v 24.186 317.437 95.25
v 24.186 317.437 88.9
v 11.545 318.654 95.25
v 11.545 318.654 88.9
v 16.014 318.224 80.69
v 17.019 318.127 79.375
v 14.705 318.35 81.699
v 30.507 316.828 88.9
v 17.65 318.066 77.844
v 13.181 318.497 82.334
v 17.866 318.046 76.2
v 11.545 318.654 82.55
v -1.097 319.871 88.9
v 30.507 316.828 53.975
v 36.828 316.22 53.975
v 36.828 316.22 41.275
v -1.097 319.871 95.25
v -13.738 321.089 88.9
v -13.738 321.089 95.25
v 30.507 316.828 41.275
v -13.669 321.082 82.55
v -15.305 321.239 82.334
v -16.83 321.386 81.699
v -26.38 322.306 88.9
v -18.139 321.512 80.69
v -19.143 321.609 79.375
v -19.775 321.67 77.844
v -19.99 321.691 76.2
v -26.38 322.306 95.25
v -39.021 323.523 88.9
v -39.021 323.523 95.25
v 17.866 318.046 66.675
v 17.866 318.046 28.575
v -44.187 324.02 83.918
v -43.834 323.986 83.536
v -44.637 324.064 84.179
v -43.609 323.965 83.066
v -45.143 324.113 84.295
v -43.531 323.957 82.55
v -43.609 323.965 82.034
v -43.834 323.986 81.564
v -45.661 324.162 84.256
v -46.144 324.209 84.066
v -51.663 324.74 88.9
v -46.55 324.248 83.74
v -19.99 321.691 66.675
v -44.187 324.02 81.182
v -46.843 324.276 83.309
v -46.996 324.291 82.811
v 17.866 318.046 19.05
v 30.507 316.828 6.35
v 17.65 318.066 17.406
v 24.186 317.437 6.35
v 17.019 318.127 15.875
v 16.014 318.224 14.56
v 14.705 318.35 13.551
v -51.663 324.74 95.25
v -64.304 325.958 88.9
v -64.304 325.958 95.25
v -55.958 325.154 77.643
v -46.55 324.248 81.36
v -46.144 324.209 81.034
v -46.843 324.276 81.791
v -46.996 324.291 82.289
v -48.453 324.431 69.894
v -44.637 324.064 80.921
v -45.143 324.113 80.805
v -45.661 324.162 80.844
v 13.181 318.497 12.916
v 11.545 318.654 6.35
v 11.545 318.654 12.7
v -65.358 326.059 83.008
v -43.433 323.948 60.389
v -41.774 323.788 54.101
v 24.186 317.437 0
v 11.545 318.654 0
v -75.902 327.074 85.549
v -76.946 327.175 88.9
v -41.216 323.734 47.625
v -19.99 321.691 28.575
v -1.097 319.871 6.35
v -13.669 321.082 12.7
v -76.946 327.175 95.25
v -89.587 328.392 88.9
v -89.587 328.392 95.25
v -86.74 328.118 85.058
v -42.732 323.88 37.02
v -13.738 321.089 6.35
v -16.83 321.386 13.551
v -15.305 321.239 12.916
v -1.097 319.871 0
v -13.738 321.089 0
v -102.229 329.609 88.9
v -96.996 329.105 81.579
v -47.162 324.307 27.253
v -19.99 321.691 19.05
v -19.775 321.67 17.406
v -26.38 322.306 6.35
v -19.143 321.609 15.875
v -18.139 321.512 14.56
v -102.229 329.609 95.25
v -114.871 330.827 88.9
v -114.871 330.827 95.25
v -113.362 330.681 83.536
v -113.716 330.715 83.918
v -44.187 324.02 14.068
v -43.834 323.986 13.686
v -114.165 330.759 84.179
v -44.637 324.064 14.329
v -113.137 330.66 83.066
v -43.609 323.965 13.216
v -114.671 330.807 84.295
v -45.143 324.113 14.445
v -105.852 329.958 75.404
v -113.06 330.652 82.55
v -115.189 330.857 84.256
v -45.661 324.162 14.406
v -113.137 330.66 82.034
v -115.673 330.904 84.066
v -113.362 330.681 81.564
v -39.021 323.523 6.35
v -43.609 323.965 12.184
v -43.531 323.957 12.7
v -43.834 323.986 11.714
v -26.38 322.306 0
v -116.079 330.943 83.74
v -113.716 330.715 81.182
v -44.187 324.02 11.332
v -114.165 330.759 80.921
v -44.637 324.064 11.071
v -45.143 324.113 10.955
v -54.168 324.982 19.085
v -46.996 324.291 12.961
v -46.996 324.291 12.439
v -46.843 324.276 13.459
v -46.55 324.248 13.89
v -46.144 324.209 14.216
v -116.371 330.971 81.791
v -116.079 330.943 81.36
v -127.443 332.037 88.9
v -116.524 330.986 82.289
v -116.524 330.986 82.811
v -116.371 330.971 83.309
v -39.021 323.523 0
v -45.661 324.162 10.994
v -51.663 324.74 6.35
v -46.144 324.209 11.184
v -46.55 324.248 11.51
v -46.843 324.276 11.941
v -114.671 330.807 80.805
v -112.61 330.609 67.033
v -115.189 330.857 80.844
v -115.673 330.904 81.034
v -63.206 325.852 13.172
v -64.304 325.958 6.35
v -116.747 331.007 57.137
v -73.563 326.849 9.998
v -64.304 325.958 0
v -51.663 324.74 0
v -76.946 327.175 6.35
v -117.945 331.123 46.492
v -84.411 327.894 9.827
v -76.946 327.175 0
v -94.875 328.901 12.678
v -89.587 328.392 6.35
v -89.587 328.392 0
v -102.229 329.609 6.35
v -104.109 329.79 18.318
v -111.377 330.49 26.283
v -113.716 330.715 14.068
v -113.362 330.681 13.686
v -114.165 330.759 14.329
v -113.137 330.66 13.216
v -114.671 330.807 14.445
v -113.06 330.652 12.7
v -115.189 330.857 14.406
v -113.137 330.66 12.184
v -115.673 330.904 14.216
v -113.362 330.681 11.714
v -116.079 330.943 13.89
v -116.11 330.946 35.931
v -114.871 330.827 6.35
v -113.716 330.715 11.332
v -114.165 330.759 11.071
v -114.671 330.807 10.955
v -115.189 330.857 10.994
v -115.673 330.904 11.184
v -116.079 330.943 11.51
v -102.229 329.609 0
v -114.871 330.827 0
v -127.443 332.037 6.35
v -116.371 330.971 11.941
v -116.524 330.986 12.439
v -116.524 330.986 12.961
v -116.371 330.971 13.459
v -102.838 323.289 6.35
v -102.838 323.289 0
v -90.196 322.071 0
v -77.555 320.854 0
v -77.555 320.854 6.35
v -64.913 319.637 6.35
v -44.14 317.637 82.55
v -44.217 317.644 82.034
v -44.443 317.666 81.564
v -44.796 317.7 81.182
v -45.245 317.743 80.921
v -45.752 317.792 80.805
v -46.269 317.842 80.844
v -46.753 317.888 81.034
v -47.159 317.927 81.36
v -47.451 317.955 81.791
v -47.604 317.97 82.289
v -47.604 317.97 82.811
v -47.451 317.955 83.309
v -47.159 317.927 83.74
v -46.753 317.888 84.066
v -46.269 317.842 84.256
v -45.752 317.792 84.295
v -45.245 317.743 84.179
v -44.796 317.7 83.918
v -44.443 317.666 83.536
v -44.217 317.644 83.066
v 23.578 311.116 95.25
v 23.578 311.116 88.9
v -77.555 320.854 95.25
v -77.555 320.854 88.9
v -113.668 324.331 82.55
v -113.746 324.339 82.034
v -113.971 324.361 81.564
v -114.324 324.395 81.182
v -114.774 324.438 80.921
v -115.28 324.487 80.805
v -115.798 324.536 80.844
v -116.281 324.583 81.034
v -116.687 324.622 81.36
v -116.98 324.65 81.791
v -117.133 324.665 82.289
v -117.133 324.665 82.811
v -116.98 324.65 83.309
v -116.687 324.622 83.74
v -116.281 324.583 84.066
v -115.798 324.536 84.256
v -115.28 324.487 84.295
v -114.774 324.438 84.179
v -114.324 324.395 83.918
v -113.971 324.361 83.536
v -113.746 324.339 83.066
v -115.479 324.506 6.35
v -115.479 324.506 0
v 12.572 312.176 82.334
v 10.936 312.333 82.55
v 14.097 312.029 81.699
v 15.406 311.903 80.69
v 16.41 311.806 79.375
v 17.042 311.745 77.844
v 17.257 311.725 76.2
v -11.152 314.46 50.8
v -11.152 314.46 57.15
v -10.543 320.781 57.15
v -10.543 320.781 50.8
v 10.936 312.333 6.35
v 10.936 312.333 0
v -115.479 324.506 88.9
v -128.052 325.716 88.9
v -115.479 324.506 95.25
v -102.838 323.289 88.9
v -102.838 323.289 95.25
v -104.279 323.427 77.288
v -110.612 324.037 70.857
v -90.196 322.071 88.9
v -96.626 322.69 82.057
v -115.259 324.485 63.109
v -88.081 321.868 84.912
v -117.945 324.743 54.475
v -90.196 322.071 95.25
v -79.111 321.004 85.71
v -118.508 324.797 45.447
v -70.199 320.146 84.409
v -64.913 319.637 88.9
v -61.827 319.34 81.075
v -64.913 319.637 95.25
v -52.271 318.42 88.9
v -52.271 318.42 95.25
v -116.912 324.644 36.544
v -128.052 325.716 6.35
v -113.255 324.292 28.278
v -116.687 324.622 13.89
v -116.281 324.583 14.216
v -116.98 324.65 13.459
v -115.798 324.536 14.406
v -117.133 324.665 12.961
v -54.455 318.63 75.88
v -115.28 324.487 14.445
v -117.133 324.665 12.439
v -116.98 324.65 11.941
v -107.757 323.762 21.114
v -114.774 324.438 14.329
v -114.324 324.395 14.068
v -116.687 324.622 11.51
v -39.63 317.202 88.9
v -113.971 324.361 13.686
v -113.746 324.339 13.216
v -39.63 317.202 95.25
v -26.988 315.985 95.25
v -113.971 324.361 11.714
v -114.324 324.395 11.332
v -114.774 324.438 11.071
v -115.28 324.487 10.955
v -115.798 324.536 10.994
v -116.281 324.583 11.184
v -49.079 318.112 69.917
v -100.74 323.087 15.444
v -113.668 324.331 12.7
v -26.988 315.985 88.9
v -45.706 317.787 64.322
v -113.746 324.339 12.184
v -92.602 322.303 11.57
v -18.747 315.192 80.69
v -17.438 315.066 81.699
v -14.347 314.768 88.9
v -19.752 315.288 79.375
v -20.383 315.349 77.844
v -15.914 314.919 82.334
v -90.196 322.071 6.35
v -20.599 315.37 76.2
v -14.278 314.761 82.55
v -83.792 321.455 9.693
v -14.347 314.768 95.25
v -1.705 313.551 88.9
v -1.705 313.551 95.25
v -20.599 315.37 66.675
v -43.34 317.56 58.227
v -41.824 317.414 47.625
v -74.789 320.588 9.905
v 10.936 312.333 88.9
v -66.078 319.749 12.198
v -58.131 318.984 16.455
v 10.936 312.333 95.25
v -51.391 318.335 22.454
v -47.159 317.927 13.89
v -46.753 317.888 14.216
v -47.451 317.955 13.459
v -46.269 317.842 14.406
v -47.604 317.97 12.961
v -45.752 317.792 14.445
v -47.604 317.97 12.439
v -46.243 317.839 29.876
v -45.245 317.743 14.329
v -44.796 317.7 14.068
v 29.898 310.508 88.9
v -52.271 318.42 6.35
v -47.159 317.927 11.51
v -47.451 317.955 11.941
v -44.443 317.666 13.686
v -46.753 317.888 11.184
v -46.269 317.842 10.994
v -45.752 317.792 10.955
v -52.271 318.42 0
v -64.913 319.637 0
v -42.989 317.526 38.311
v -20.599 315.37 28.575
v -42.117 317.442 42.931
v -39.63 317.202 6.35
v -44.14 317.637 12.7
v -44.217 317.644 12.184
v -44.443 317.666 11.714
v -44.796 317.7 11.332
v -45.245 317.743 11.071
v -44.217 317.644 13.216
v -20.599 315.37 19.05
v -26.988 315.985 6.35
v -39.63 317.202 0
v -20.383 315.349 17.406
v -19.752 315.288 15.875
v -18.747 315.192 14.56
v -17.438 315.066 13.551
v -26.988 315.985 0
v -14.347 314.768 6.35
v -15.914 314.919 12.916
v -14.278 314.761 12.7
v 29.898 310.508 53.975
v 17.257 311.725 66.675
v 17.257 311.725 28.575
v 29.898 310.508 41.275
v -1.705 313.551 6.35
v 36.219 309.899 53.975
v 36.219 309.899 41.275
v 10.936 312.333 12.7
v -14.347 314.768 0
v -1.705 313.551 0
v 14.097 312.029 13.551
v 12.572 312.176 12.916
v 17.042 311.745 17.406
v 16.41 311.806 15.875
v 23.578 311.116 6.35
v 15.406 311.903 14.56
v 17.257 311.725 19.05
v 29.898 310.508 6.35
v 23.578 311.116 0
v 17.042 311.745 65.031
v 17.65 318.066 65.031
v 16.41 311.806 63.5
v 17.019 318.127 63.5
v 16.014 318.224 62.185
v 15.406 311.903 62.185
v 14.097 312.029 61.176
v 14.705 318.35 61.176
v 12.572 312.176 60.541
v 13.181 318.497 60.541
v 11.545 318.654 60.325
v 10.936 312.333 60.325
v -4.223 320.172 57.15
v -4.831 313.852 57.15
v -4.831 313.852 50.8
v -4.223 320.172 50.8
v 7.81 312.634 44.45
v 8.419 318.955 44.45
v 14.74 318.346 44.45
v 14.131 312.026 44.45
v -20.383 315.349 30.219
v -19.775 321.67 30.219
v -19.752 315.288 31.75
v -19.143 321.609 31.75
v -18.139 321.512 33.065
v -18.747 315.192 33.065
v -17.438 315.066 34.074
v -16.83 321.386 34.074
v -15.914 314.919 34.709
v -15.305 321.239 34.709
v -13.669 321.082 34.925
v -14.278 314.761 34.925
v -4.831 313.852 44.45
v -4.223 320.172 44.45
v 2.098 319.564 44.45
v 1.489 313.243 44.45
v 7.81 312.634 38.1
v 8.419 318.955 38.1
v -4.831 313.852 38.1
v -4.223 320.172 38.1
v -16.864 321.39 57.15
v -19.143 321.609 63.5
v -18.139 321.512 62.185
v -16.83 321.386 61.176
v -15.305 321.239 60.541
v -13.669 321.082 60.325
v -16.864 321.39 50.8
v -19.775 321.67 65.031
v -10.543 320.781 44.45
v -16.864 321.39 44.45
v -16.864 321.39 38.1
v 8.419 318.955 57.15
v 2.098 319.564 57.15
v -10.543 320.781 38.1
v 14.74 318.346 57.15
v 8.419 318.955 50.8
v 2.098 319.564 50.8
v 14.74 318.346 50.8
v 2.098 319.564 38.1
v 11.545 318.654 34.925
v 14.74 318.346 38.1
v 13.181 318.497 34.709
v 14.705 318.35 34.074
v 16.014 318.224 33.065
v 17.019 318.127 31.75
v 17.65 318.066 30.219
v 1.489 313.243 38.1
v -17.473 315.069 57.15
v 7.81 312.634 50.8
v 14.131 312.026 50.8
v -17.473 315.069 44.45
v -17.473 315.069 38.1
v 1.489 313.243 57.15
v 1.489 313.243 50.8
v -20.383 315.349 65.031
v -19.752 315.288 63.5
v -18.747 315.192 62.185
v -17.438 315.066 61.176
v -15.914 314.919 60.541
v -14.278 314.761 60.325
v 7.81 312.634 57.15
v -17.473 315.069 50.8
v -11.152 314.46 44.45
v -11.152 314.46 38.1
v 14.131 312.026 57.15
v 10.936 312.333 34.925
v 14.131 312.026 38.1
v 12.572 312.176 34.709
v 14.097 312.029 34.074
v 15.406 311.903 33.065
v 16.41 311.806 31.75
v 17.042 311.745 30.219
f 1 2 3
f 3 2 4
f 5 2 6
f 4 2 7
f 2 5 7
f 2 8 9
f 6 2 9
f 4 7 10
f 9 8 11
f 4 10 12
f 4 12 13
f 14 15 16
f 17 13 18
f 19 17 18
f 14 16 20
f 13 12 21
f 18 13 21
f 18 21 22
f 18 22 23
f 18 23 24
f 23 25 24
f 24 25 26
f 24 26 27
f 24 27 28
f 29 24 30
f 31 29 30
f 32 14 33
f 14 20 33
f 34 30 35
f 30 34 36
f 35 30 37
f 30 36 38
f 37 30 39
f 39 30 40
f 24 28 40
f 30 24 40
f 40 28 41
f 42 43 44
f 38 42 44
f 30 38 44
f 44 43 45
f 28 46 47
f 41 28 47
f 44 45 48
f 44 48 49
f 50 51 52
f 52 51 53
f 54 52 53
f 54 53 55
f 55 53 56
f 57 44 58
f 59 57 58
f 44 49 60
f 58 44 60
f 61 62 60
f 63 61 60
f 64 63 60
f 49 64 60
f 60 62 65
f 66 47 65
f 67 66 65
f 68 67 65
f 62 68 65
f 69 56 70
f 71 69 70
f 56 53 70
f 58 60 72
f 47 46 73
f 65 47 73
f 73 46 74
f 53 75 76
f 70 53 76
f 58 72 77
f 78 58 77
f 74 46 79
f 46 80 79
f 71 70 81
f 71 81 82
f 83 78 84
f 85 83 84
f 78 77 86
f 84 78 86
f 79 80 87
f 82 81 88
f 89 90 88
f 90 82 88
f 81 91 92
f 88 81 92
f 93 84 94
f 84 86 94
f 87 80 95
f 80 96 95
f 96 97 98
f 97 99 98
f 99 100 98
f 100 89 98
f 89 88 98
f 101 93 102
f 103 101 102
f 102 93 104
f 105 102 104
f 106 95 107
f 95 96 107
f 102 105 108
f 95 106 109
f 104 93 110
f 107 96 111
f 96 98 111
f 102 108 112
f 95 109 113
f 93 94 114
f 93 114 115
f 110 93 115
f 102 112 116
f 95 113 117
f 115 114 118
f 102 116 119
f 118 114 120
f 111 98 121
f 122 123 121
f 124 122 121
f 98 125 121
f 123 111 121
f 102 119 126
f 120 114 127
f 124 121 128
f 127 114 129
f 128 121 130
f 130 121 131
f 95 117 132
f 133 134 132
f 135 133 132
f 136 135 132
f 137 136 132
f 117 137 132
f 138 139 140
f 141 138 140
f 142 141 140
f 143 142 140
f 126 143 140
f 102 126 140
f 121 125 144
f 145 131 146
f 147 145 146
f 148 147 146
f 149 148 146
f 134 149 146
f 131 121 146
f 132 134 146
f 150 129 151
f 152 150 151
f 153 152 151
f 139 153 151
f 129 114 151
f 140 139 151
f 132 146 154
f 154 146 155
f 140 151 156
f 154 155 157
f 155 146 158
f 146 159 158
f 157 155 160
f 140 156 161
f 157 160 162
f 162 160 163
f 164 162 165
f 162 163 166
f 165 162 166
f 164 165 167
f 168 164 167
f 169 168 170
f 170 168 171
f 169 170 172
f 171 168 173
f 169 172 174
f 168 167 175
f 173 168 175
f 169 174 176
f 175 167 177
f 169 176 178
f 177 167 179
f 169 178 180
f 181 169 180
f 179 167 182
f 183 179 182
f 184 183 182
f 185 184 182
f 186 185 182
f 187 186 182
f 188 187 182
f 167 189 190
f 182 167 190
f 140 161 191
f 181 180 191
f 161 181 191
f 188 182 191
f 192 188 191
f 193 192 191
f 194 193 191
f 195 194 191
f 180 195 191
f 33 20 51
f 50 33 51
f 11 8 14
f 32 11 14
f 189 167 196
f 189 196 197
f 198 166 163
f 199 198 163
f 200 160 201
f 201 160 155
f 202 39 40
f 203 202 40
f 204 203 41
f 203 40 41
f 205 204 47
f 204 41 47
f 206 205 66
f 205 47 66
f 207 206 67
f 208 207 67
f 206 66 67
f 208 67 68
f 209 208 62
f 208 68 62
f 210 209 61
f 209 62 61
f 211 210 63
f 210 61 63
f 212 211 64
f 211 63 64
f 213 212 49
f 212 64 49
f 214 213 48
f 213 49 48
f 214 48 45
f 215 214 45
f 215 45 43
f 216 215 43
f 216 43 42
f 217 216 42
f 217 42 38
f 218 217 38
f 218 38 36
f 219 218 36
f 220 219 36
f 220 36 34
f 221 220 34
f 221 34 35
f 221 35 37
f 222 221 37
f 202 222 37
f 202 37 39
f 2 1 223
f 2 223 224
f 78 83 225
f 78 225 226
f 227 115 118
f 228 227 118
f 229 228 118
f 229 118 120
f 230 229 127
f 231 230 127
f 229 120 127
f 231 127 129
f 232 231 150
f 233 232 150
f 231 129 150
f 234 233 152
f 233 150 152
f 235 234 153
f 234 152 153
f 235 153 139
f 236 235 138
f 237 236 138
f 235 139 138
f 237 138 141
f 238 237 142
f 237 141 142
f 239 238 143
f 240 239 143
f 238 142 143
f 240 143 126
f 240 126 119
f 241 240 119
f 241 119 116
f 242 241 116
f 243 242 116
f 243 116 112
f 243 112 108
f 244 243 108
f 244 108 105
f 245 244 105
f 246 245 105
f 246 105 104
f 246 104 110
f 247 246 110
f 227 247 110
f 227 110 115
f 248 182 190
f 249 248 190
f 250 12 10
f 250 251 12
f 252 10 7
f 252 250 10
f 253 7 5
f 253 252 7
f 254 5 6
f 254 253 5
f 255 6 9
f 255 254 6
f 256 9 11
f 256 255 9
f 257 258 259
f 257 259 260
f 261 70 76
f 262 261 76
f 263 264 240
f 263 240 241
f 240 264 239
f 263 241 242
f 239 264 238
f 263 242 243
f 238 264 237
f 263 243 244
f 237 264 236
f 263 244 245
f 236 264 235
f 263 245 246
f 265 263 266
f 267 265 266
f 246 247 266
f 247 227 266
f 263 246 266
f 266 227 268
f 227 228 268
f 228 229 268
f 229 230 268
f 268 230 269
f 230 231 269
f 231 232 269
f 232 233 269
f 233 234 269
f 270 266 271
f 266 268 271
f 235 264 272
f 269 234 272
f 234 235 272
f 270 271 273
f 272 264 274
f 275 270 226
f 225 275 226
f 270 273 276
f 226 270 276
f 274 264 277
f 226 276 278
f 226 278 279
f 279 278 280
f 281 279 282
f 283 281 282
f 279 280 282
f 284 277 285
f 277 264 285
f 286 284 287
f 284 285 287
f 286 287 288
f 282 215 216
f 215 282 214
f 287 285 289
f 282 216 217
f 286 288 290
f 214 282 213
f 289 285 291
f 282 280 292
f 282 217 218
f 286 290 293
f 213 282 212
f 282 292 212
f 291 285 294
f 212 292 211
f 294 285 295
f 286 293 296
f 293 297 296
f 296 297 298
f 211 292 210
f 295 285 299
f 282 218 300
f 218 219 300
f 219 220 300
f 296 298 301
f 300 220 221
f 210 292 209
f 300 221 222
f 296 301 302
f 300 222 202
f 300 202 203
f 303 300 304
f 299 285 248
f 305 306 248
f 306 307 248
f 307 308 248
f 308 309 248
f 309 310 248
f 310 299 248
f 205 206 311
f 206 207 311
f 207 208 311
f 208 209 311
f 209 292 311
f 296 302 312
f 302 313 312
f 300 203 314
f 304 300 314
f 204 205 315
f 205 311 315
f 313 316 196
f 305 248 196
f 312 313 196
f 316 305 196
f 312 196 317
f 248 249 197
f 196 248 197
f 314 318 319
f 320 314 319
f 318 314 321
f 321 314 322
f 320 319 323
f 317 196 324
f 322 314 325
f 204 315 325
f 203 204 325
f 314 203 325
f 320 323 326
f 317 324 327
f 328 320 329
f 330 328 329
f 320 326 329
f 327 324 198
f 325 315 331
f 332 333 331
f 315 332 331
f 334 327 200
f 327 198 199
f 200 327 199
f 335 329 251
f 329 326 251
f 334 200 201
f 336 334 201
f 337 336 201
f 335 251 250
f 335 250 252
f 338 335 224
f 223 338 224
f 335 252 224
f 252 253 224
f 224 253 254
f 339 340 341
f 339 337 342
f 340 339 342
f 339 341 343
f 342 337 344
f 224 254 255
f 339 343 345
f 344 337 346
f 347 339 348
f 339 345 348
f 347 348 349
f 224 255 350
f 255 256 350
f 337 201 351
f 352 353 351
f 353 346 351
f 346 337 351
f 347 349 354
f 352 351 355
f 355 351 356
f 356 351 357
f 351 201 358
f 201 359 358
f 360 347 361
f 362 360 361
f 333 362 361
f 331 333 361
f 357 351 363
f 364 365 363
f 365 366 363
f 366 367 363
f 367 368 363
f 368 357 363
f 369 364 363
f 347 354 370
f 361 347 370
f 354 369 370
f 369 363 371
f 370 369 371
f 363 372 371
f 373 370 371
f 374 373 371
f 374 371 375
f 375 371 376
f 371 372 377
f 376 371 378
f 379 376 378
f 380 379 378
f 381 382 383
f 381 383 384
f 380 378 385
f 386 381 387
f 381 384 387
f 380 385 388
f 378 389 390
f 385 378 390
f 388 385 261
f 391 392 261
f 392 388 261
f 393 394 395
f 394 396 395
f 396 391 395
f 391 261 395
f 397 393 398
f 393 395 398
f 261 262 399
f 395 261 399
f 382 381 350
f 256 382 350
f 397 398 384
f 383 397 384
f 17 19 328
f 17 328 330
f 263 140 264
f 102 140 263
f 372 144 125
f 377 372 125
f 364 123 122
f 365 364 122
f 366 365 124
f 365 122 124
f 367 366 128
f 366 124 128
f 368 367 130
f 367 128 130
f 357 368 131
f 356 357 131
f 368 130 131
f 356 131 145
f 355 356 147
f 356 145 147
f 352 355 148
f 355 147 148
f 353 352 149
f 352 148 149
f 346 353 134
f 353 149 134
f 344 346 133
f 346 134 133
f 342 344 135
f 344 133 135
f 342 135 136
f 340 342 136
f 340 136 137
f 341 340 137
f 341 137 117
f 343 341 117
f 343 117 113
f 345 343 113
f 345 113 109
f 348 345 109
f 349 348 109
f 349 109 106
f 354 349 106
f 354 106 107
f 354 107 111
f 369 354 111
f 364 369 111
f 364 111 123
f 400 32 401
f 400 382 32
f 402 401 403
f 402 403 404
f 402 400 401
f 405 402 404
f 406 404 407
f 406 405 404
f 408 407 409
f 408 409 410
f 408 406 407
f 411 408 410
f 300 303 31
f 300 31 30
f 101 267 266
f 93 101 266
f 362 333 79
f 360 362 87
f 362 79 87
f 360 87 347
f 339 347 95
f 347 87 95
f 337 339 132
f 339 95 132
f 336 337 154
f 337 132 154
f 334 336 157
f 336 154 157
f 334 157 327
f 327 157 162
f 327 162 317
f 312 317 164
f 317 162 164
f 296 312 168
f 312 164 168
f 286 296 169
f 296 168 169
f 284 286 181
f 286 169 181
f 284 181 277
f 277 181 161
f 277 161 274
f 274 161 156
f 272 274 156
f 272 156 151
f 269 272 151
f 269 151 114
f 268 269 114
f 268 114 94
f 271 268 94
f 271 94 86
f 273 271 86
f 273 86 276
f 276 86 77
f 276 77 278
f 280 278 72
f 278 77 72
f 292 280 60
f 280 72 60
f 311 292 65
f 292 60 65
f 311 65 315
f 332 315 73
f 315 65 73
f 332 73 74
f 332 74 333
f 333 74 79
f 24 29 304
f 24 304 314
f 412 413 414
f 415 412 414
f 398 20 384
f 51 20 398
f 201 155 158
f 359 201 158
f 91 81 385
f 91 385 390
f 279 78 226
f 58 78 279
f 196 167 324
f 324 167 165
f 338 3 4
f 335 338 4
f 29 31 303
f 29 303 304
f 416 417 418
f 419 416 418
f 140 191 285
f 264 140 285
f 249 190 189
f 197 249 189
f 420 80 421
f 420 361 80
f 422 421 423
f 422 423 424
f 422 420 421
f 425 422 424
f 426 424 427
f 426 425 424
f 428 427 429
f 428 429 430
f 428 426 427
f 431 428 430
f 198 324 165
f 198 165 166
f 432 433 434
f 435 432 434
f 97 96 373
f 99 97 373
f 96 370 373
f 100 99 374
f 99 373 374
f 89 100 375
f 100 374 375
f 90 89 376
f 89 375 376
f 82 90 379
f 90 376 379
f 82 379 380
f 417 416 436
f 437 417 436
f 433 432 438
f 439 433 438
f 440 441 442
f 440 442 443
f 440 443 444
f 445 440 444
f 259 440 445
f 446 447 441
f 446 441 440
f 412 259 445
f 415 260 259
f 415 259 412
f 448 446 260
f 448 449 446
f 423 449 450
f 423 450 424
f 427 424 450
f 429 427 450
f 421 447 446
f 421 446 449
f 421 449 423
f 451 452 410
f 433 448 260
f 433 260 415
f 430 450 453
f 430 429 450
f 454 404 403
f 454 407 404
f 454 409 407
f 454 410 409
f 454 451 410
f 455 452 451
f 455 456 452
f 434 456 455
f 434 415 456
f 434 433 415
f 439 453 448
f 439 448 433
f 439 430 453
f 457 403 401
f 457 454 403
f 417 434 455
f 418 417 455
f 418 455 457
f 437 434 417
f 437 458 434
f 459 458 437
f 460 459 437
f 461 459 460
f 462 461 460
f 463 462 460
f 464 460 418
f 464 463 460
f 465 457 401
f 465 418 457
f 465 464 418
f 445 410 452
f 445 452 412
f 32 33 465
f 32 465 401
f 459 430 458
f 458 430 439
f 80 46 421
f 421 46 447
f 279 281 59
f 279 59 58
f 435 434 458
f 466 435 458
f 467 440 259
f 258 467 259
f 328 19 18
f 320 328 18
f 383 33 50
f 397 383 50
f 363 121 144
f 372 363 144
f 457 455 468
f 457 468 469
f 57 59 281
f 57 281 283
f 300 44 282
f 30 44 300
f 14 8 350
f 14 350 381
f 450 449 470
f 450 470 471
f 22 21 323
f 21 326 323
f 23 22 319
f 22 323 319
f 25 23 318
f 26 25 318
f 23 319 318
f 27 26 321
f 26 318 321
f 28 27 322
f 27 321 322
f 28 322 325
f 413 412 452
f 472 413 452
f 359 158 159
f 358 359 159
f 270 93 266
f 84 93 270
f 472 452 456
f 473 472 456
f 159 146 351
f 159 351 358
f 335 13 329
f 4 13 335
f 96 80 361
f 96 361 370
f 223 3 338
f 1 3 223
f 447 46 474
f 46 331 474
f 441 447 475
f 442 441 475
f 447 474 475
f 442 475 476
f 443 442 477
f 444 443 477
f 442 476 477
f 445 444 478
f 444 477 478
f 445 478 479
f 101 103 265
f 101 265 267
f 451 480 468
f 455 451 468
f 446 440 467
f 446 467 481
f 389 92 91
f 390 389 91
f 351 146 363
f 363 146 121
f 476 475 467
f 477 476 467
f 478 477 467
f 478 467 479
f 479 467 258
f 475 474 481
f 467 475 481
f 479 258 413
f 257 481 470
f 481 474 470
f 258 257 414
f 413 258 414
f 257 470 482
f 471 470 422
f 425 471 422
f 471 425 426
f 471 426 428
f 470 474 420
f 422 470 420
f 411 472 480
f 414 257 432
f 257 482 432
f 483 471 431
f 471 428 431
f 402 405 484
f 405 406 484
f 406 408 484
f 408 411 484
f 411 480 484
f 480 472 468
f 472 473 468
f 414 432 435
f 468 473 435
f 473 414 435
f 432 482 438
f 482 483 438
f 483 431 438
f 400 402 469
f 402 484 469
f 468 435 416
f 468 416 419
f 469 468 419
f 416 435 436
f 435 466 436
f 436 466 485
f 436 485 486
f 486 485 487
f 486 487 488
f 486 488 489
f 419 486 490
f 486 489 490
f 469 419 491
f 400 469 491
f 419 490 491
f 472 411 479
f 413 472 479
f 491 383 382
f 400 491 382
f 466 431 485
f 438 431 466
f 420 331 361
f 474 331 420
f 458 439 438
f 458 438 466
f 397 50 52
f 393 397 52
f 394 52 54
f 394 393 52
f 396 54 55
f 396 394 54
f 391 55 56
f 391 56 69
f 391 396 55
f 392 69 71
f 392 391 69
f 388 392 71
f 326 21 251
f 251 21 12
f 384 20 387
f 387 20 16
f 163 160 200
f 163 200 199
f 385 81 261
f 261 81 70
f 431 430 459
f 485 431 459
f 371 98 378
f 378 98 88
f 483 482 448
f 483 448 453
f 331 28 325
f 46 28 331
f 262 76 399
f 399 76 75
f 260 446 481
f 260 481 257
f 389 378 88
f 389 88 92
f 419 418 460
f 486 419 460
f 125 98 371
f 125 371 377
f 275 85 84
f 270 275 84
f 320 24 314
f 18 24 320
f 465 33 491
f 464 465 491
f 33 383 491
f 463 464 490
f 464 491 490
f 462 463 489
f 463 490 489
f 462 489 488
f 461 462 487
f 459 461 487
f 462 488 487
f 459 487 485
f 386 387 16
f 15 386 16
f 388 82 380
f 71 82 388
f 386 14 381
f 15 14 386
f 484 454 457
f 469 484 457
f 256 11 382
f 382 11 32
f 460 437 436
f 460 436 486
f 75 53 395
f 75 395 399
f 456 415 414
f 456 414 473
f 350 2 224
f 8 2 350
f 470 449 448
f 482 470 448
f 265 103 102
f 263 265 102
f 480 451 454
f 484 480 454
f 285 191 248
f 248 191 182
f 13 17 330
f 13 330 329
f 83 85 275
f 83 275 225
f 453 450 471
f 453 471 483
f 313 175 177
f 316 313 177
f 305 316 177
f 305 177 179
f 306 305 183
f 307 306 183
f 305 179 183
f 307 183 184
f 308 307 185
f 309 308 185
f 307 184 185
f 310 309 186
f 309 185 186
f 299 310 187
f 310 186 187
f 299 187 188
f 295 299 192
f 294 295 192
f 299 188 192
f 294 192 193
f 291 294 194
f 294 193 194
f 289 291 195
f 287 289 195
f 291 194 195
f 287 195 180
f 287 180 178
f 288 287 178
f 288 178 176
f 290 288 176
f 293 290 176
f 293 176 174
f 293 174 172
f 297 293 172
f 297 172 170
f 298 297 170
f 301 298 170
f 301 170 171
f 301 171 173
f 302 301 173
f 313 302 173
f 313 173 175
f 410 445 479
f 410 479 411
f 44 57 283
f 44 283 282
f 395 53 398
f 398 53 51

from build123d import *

# Parameters (mm, degrees)
BOSS_EXTRUDE1_DEPTH = 95.25
SKETCH3_RX          = 38.550537557
SKETCH3_RY          = 38.1
CUT_EXTRUDE1_DEPTH  = 23.094676213
SKETCH4_R           = 1.75
CUT_EXTRUDE2_DEPTH  = 23.094676322
SKETCH5_W           = 38.030754259
SKETCH5_H           = 69.85
CUT_EXTRUDE3_DEPTH  = 23.094676322
SKETCH7_W           = 12.7
SKETCH7_H           = 6.35
CUT_EXTRUDE4_DEPTH  = 23.094676322
LPATTERN1_COUNT     = 17
LPATTERN1_PITCH     = 25.4
SKETCH8_W           = 6.35
SKETCH8_H           = 34.925
CUT_EXTRUDE5_DEPTH  = 23.094676322
SKETCH9_W           = 38.030754259
SKETCH9_H           = 25.4
BOSS_EXTRUDE2_DEPTH = 6.35
SKETCH10_W          = 6.35
SKETCH10_H          = 6.35
CUT_EXTRUDE6_DEPTH  = 23.094676322
LPATTERN2_COUNT     = 2
LPATTERN2_PITCH     = 12.7
LPATTERN2_COL_COUNT = 2
LPATTERN2_COL_PITCH = 12.7
FILLET1_R           = 6.35


with BuildPart() as part:
    # Sketch2 → Boss-Extrude1 (new body)
    with BuildSketch(Plane.XY):
        Polygon((-127.443127302, 332.037142994), (-128.051747831, 325.716377135), (36.219237573, 309.898880304), (36.827858101, 316.219646163), align=None)
    extrude(amount=BOSS_EXTRUDE1_DEPTH)

    # Sketch3 → Cut-Extrude1 (cut, through all)
    with BuildSketch(Plane(origin=(30.507092242, 316.828266692, 0), x_dir=(0.995396198, -0.095845753, 0), z_dir=(0.095845753, 0.995396198, 0))):
        with Locations((-110.605216702, -47.625)):
            Ellipse(SKETCH3_RX, SKETCH3_RY)
    extrude(amount=-CUT_EXTRUDE1_DEPTH, mode=Mode.SUBTRACT)

    # Sketch4 → Cut-Extrude2 (cut, through all)
    with BuildSketch(Plane(origin=(30.507092242, 316.828266692, 0), x_dir=(0.995396198, -0.095845753, 0), z_dir=(0.095845753, 0.995396198, 0))):
        with Locations((-145.980754259, -12.7)):
            Circle(SKETCH4_R)
        with Locations((-145.980754259, -82.55)):
            Circle(SKETCH4_R)
        with Locations((-76.130754259, -82.55)):
            Circle(SKETCH4_R)
        with Locations((-76.130754259, -12.7)):
            Circle(SKETCH4_R)
    extrude(amount=-CUT_EXTRUDE2_DEPTH, mode=Mode.SUBTRACT)

    # Sketch5 → Cut-Extrude3 (cut, through all)
    with BuildSketch(Plane(origin=(30.507092242, 316.828266692, 0), x_dir=(0.995396198, -0.095845753, 0), z_dir=(0.095845753, 0.995396198, 0))):
        with Locations((-31.71537713, -47.625)):
            Rectangle(SKETCH5_W, SKETCH5_H)
    extrude(amount=-CUT_EXTRUDE3_DEPTH, mode=Mode.SUBTRACT)

    # Sketch7 → Cut-Extrude4 (cut, through all)
    with BuildSketch(Plane(origin=(30.507092242, 316.828266692, 0), x_dir=(0.995396198, -0.095845753, 0), z_dir=(0.095845753, 0.995396198, 0))):
        with Locations((0, -3.175)):
            Rectangle(SKETCH7_W, SKETCH7_H)
        with Locations((0, -92.075)):
            Rectangle(SKETCH7_W, SKETCH7_H)
    cut_extrude4 = extrude(amount=-CUT_EXTRUDE4_DEPTH, mode=Mode.SUBTRACT)

    # LPattern1: Cut-Extrude4 ×17
    with Locations(*[Vector(-0.995396198, 0.095845753, 0) * (i * LPATTERN1_PITCH) for i in range(1, LPATTERN1_COUNT)]):
        add(cut_extrude4, mode=Mode.SUBTRACT)

    # Sketch8 → Cut-Extrude5 (cut, through all)
    with BuildSketch(Plane(origin=(30.507092242, 316.828266692, 0), x_dir=(0.995396198, -0.095845753, 0), z_dir=(0.095845753, 0.995396198, 0))):
        with Locations((3.175, -23.8125)):
            Rectangle(SKETCH8_W, SKETCH8_H)
        with Locations((3.175, -71.4375)):
            Rectangle(SKETCH8_W, SKETCH8_H)
    extrude(amount=-CUT_EXTRUDE5_DEPTH, mode=Mode.SUBTRACT)

    # Sketch9 → Boss-Extrude2 (add)
    with BuildSketch(Plane(origin=(30.507092242, 316.828266692, 0), x_dir=(0.995396198, -0.095845753, 0), z_dir=(0.095845753, 0.995396198, 0))):
        with Locations((-31.71537713, -47.625)):
            Rectangle(SKETCH9_W, SKETCH9_H)
    extrude(amount=-BOSS_EXTRUDE2_DEPTH)

    # Sketch10 → Cut-Extrude6 (cut, through all)
    with BuildSketch(Plane(origin=(30.507092242, 316.828266692, 0), x_dir=(0.995396198, -0.095845753, 0), z_dir=(0.095845753, 0.995396198, 0))):
        with Locations((-31.71537713, -41.275)):
            Rectangle(SKETCH10_W, SKETCH10_H)
        with Locations((-31.71537713, -53.975)):
            Rectangle(SKETCH10_W, SKETCH10_H)
    cut_extrude6 = extrude(amount=-CUT_EXTRUDE6_DEPTH, mode=Mode.SUBTRACT)

    # LPattern2: Cut-Extrude6 ×2
    with Locations(*[Vector(0.995396198, -0.095845753, 0) * (i * LPATTERN2_PITCH) for i in range(1, LPATTERN2_COUNT)]):
        add(cut_extrude6, mode=Mode.SUBTRACT)

    # LPattern2 col: Cut-Extrude6 ×2
    with Locations(*[Vector(-0.995396198, 0.095845753, 0) * (i * LPATTERN2_COL_PITCH) for i in range(1, LPATTERN2_COL_COUNT)]):
        add(cut_extrude6, mode=Mode.SUBTRACT)

    # Fillet1
    fillet1_edges = [part.edges().sort_by_distance(p)[0] for p in [
        (17.561250258, 314.885124819, 34.925),
        (17.561250258, 314.885124819, 60.325),
        (-20.294417953, 318.53021108, 60.325),
        (-20.294417953, 318.53021108, 34.925),
        (-20.294417953, 318.53021108, 82.55),
        (-20.294417953, 318.53021108, 12.7),
        (17.561250258, 314.885124819, 12.7),
        (17.561250258, 314.885124819, 82.55),
    ]]
    fillet(fillet1_edges, radius=FILLET1_R)


solid = part.part
